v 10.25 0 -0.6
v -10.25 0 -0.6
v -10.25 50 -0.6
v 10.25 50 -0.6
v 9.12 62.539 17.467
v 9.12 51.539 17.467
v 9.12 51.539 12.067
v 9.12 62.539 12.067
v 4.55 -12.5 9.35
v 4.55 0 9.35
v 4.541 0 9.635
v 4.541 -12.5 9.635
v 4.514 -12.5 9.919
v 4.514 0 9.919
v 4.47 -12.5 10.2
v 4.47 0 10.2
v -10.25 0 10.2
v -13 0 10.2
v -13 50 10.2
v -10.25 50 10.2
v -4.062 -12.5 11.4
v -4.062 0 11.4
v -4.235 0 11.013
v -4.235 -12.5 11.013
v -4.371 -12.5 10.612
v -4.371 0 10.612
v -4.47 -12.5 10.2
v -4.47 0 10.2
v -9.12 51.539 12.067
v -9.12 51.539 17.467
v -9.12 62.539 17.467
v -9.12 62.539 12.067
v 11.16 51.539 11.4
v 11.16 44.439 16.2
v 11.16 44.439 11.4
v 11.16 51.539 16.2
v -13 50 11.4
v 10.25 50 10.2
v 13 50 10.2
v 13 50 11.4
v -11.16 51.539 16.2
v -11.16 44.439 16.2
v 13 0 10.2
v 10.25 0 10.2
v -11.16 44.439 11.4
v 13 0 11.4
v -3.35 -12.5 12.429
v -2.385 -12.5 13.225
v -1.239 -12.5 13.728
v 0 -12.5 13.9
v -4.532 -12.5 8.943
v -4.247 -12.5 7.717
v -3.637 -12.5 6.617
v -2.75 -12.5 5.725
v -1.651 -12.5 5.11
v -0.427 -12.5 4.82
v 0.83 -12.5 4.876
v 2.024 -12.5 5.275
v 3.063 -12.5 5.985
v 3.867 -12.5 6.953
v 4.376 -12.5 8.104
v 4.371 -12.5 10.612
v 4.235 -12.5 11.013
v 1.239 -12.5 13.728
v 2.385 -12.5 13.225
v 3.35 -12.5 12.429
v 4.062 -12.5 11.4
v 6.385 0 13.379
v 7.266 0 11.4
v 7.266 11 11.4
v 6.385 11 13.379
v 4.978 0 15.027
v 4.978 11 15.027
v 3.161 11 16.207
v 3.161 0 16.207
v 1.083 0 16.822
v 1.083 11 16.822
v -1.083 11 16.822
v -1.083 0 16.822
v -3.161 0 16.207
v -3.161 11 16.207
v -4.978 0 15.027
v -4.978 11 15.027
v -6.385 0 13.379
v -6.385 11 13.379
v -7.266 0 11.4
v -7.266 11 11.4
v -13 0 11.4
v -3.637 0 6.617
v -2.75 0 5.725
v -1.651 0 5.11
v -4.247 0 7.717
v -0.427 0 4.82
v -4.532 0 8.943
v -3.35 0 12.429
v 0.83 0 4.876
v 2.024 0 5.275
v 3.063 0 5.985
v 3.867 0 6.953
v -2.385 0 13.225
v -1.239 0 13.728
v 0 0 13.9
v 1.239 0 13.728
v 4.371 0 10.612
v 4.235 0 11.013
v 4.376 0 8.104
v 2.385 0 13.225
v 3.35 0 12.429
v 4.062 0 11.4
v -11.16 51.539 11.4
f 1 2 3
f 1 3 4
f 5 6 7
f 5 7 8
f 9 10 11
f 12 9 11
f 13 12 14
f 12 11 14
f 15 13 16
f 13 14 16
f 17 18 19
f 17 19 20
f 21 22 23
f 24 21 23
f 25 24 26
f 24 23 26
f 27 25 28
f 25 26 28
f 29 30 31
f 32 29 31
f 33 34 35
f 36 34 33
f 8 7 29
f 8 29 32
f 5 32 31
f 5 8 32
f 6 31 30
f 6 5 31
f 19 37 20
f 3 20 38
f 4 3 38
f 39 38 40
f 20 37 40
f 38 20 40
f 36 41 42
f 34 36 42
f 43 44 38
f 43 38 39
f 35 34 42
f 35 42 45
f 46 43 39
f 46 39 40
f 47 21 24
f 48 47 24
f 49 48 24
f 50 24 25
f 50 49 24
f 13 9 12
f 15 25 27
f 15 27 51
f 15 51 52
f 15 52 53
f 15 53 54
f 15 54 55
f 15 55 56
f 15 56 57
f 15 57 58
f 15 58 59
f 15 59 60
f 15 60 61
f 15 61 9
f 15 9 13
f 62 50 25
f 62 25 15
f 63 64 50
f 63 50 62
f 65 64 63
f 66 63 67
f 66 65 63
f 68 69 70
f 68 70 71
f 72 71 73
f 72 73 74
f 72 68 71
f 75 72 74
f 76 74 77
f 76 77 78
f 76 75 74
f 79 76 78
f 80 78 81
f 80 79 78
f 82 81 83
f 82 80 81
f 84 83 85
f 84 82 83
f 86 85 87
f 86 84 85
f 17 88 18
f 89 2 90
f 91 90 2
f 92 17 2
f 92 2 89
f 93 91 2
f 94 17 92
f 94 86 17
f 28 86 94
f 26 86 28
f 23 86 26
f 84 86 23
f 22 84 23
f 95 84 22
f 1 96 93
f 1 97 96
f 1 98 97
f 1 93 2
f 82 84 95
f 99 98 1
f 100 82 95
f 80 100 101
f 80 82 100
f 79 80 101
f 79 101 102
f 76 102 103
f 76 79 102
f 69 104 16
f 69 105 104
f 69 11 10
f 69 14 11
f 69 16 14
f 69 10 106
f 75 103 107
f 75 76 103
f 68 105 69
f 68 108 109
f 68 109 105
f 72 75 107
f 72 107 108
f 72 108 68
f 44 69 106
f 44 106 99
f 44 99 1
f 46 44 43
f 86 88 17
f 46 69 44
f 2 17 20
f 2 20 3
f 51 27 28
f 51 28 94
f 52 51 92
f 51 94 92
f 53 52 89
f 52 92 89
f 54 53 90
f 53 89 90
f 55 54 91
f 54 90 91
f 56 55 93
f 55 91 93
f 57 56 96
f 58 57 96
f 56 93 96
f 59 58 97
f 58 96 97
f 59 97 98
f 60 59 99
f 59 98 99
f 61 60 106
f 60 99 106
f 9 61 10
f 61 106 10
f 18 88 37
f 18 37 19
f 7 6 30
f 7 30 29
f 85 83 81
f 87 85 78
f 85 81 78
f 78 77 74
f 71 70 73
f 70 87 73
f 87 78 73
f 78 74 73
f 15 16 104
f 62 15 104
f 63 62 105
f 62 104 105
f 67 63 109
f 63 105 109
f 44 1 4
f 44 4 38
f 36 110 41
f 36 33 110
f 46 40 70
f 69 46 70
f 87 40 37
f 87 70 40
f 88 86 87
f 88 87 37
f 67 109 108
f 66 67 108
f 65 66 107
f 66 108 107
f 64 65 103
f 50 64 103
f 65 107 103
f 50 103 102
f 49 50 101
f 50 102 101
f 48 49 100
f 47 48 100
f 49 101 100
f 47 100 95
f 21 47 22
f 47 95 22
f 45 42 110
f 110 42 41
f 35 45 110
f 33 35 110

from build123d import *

# Parameters (mm, degrees)
F2_DEPTH = 12.5
F3_DEPTH = 50
F4_DEPTH = 11
F6_DEPTH = 9.12
F7_DEPTH = 11.16


with BuildPart() as f2:
    # F1 (on Front) → F2 (new body)
    with BuildSketch(Plane.XZ):
        with BuildLine():
            ThreePointArc((4.55, 9.35), (4.5299305702, 9.7768829224), (4.4698993277, 10.2))
            Line((4.4698993277, 10.2), (-4.4698993277, 10.2))
            ThreePointArc((-4.4698993277, 10.2), (-0.4268829224, 4.8200694298), (4.55, 9.35))
        make_face()
        with BuildLine():
            Line((-4.4698993277, 10.2), (4.4698993277, 10.2))
            ThreePointArc((4.4698993277, 10.2), (4.3079471272, 10.8142716787), (4.0620192023, 11.4))
            Line((4.0620192023, 11.4), (-4.0620192023, 11.4))
            ThreePointArc((-4.0620192023, 11.4), (-4.3079471272, 10.8142716787), (-4.4698993277, 10.2))
        make_face()
        with BuildLine():
            Line((-4.0620192023, 11.4), (4.0620192023, 11.4))
            ThreePointArc((4.0620192023, 11.4), (0, 13.9), (-4.0620192023, 11.4))
        make_face()
    extrude(amount=F2_DEPTH)

    # F1 (on Front) → F3 (join)
    with BuildSketch(Plane.XZ):
        with BuildLine():
            Line((7.5019997334, 10.2), (10.25, 10.2))
            Line((10.25, 10.2), (13, 10.2))
            Line((13, 10.2), (13, 11.4))
            Line((13, 11.4), (7.2663608498, 11.4))
            ThreePointArc((7.2663608498, 11.4), (7.4085166247, 10.804778822), (7.5019997334, 10.2))
        make_face()
        with BuildLine():
            Line((4.4698993277, 10.2), (7.5019997334, 10.2))
            ThreePointArc((7.5019997334, 10.2), (7.4085166247, 10.804778822), (7.2663608498, 11.4))
            Line((7.2663608498, 11.4), (4.0620192023, 11.4))
            ThreePointArc((4.0620192023, 11.4), (4.3079471272, 10.8142716787), (4.4698993277, 10.2))
        make_face()
        with BuildLine():
            Line((-4.4698993277, 10.2), (4.4698993277, 10.2))
            ThreePointArc((4.4698993277, 10.2), (4.3079471272, 10.8142716787), (4.0620192023, 11.4))
            Line((4.0620192023, 11.4), (-4.0620192023, 11.4))
            ThreePointArc((-4.0620192023, 11.4), (-4.3079471272, 10.8142716787), (-4.4698993277, 10.2))
        make_face()
        with BuildLine():
            ThreePointArc((-7.2663608498, 11.4), (-7.4085166247, 10.804778822), (-7.5019997334, 10.2))
            Line((-7.5019997334, 10.2), (-4.4698993277, 10.2))
            ThreePointArc((-4.4698993277, 10.2), (-4.3079471272, 10.8142716787), (-4.0620192023, 11.4))
            Line((-4.0620192023, 11.4), (-7.2663608498, 11.4))
        make_face()
        with BuildLine():
            Line((-13, 10.2), (-10.25, 10.2))
            Line((-10.25, 10.2), (-7.5019997334, 10.2))
            ThreePointArc((-7.5019997334, 10.2), (-7.4085166247, 10.804778822), (-7.2663608498, 11.4))
            Line((-7.2663608498, 11.4), (-13, 11.4))
            Line((-13, 11.4), (-13, 10.2))
        make_face()
        with BuildLine():
            Line((-10.25, -0.6), (10.25, -0.6))
            Line((10.25, -0.6), (10.25, 10.2))
            Line((10.25, 10.2), (7.5019997334, 10.2))
            ThreePointArc((7.5019997334, 10.2), (7.5379903816, 9.7756771152), (7.55, 9.35))
            ThreePointArc((7.55, 9.35), (-0.4256771152, 1.8120096184), (-7.5019997334, 10.2))
            Line((-7.5019997334, 10.2), (-10.25, 10.2))
            Line((-10.25, 10.2), (-10.25, -0.6))
        make_face()
        with BuildLine():
            ThreePointArc((7.55, 9.35), (7.5379903816, 9.7756771152), (7.5019997334, 10.2))
            Line((7.5019997334, 10.2), (4.4698993277, 10.2))
            ThreePointArc((4.4698993277, 10.2), (4.5299305702, 9.7768829224), (4.55, 9.35))
            ThreePointArc((4.55, 9.35), (-0.4268829224, 4.8200694298), (-4.4698993277, 10.2))
            Line((-4.4698993277, 10.2), (-7.5019997334, 10.2))
            ThreePointArc((-7.5019997334, 10.2), (-0.4256771152, 1.8120096184), (7.55, 9.35))
        make_face()
        with BuildLine():
            ThreePointArc((4.55, 9.35), (4.5299305702, 9.7768829224), (4.4698993277, 10.2))
            Line((4.4698993277, 10.2), (-4.4698993277, 10.2))
            ThreePointArc((-4.4698993277, 10.2), (-0.4268829224, 4.8200694298), (4.55, 9.35))
        make_face()
    extrude(amount=-F3_DEPTH)

    # F1 (on Front) → F4 (join)
    with BuildSketch(Plane.XZ):
        with BuildLine():
            Line((4.0620192023, 11.4), (7.2663608498, 11.4))
            ThreePointArc((7.2663608498, 11.4), (0, 16.9), (-7.2663608498, 11.4))
            Line((-7.2663608498, 11.4), (-4.0620192023, 11.4))
            ThreePointArc((-4.0620192023, 11.4), (0, 13.9), (4.0620192023, 11.4))
        make_face()
        with BuildLine():
            Line((-4.0620192023, 11.4), (4.0620192023, 11.4))
            ThreePointArc((4.0620192023, 11.4), (0, 13.9), (-4.0620192023, 11.4))
        make_face()
    extrude(amount=-F4_DEPTH)


with BuildPart() as f6:
    # F5 (on Right) → F6 (new body, symmetric)
    with BuildSketch(Plane.YZ):
        Polygon((62.5386638701, 17.4665924624), (51.5386638701, 17.4665924624), (51.5386638701, 16.2), (51.5386638701, 12.0665924624), (62.5386638701, 12.0665924624), align=None)
    extrude(amount=F6_DEPTH, both=True)


with BuildPart() as f7:
    # F5 (on Right) → F7 (new body, symmetric)
    with BuildSketch(Plane.YZ):
        Polygon((51.5386638701, 12.0665924624), (51.5386638701, 16.2), (44.4386638701, 16.2), (44.4386638701, 11.4), (50, 11.4), (51.5386638701, 11.4), align=None)
    extrude(amount=F7_DEPTH, both=True)


solid = Compound([f2.part, f6.part, f7.part])
